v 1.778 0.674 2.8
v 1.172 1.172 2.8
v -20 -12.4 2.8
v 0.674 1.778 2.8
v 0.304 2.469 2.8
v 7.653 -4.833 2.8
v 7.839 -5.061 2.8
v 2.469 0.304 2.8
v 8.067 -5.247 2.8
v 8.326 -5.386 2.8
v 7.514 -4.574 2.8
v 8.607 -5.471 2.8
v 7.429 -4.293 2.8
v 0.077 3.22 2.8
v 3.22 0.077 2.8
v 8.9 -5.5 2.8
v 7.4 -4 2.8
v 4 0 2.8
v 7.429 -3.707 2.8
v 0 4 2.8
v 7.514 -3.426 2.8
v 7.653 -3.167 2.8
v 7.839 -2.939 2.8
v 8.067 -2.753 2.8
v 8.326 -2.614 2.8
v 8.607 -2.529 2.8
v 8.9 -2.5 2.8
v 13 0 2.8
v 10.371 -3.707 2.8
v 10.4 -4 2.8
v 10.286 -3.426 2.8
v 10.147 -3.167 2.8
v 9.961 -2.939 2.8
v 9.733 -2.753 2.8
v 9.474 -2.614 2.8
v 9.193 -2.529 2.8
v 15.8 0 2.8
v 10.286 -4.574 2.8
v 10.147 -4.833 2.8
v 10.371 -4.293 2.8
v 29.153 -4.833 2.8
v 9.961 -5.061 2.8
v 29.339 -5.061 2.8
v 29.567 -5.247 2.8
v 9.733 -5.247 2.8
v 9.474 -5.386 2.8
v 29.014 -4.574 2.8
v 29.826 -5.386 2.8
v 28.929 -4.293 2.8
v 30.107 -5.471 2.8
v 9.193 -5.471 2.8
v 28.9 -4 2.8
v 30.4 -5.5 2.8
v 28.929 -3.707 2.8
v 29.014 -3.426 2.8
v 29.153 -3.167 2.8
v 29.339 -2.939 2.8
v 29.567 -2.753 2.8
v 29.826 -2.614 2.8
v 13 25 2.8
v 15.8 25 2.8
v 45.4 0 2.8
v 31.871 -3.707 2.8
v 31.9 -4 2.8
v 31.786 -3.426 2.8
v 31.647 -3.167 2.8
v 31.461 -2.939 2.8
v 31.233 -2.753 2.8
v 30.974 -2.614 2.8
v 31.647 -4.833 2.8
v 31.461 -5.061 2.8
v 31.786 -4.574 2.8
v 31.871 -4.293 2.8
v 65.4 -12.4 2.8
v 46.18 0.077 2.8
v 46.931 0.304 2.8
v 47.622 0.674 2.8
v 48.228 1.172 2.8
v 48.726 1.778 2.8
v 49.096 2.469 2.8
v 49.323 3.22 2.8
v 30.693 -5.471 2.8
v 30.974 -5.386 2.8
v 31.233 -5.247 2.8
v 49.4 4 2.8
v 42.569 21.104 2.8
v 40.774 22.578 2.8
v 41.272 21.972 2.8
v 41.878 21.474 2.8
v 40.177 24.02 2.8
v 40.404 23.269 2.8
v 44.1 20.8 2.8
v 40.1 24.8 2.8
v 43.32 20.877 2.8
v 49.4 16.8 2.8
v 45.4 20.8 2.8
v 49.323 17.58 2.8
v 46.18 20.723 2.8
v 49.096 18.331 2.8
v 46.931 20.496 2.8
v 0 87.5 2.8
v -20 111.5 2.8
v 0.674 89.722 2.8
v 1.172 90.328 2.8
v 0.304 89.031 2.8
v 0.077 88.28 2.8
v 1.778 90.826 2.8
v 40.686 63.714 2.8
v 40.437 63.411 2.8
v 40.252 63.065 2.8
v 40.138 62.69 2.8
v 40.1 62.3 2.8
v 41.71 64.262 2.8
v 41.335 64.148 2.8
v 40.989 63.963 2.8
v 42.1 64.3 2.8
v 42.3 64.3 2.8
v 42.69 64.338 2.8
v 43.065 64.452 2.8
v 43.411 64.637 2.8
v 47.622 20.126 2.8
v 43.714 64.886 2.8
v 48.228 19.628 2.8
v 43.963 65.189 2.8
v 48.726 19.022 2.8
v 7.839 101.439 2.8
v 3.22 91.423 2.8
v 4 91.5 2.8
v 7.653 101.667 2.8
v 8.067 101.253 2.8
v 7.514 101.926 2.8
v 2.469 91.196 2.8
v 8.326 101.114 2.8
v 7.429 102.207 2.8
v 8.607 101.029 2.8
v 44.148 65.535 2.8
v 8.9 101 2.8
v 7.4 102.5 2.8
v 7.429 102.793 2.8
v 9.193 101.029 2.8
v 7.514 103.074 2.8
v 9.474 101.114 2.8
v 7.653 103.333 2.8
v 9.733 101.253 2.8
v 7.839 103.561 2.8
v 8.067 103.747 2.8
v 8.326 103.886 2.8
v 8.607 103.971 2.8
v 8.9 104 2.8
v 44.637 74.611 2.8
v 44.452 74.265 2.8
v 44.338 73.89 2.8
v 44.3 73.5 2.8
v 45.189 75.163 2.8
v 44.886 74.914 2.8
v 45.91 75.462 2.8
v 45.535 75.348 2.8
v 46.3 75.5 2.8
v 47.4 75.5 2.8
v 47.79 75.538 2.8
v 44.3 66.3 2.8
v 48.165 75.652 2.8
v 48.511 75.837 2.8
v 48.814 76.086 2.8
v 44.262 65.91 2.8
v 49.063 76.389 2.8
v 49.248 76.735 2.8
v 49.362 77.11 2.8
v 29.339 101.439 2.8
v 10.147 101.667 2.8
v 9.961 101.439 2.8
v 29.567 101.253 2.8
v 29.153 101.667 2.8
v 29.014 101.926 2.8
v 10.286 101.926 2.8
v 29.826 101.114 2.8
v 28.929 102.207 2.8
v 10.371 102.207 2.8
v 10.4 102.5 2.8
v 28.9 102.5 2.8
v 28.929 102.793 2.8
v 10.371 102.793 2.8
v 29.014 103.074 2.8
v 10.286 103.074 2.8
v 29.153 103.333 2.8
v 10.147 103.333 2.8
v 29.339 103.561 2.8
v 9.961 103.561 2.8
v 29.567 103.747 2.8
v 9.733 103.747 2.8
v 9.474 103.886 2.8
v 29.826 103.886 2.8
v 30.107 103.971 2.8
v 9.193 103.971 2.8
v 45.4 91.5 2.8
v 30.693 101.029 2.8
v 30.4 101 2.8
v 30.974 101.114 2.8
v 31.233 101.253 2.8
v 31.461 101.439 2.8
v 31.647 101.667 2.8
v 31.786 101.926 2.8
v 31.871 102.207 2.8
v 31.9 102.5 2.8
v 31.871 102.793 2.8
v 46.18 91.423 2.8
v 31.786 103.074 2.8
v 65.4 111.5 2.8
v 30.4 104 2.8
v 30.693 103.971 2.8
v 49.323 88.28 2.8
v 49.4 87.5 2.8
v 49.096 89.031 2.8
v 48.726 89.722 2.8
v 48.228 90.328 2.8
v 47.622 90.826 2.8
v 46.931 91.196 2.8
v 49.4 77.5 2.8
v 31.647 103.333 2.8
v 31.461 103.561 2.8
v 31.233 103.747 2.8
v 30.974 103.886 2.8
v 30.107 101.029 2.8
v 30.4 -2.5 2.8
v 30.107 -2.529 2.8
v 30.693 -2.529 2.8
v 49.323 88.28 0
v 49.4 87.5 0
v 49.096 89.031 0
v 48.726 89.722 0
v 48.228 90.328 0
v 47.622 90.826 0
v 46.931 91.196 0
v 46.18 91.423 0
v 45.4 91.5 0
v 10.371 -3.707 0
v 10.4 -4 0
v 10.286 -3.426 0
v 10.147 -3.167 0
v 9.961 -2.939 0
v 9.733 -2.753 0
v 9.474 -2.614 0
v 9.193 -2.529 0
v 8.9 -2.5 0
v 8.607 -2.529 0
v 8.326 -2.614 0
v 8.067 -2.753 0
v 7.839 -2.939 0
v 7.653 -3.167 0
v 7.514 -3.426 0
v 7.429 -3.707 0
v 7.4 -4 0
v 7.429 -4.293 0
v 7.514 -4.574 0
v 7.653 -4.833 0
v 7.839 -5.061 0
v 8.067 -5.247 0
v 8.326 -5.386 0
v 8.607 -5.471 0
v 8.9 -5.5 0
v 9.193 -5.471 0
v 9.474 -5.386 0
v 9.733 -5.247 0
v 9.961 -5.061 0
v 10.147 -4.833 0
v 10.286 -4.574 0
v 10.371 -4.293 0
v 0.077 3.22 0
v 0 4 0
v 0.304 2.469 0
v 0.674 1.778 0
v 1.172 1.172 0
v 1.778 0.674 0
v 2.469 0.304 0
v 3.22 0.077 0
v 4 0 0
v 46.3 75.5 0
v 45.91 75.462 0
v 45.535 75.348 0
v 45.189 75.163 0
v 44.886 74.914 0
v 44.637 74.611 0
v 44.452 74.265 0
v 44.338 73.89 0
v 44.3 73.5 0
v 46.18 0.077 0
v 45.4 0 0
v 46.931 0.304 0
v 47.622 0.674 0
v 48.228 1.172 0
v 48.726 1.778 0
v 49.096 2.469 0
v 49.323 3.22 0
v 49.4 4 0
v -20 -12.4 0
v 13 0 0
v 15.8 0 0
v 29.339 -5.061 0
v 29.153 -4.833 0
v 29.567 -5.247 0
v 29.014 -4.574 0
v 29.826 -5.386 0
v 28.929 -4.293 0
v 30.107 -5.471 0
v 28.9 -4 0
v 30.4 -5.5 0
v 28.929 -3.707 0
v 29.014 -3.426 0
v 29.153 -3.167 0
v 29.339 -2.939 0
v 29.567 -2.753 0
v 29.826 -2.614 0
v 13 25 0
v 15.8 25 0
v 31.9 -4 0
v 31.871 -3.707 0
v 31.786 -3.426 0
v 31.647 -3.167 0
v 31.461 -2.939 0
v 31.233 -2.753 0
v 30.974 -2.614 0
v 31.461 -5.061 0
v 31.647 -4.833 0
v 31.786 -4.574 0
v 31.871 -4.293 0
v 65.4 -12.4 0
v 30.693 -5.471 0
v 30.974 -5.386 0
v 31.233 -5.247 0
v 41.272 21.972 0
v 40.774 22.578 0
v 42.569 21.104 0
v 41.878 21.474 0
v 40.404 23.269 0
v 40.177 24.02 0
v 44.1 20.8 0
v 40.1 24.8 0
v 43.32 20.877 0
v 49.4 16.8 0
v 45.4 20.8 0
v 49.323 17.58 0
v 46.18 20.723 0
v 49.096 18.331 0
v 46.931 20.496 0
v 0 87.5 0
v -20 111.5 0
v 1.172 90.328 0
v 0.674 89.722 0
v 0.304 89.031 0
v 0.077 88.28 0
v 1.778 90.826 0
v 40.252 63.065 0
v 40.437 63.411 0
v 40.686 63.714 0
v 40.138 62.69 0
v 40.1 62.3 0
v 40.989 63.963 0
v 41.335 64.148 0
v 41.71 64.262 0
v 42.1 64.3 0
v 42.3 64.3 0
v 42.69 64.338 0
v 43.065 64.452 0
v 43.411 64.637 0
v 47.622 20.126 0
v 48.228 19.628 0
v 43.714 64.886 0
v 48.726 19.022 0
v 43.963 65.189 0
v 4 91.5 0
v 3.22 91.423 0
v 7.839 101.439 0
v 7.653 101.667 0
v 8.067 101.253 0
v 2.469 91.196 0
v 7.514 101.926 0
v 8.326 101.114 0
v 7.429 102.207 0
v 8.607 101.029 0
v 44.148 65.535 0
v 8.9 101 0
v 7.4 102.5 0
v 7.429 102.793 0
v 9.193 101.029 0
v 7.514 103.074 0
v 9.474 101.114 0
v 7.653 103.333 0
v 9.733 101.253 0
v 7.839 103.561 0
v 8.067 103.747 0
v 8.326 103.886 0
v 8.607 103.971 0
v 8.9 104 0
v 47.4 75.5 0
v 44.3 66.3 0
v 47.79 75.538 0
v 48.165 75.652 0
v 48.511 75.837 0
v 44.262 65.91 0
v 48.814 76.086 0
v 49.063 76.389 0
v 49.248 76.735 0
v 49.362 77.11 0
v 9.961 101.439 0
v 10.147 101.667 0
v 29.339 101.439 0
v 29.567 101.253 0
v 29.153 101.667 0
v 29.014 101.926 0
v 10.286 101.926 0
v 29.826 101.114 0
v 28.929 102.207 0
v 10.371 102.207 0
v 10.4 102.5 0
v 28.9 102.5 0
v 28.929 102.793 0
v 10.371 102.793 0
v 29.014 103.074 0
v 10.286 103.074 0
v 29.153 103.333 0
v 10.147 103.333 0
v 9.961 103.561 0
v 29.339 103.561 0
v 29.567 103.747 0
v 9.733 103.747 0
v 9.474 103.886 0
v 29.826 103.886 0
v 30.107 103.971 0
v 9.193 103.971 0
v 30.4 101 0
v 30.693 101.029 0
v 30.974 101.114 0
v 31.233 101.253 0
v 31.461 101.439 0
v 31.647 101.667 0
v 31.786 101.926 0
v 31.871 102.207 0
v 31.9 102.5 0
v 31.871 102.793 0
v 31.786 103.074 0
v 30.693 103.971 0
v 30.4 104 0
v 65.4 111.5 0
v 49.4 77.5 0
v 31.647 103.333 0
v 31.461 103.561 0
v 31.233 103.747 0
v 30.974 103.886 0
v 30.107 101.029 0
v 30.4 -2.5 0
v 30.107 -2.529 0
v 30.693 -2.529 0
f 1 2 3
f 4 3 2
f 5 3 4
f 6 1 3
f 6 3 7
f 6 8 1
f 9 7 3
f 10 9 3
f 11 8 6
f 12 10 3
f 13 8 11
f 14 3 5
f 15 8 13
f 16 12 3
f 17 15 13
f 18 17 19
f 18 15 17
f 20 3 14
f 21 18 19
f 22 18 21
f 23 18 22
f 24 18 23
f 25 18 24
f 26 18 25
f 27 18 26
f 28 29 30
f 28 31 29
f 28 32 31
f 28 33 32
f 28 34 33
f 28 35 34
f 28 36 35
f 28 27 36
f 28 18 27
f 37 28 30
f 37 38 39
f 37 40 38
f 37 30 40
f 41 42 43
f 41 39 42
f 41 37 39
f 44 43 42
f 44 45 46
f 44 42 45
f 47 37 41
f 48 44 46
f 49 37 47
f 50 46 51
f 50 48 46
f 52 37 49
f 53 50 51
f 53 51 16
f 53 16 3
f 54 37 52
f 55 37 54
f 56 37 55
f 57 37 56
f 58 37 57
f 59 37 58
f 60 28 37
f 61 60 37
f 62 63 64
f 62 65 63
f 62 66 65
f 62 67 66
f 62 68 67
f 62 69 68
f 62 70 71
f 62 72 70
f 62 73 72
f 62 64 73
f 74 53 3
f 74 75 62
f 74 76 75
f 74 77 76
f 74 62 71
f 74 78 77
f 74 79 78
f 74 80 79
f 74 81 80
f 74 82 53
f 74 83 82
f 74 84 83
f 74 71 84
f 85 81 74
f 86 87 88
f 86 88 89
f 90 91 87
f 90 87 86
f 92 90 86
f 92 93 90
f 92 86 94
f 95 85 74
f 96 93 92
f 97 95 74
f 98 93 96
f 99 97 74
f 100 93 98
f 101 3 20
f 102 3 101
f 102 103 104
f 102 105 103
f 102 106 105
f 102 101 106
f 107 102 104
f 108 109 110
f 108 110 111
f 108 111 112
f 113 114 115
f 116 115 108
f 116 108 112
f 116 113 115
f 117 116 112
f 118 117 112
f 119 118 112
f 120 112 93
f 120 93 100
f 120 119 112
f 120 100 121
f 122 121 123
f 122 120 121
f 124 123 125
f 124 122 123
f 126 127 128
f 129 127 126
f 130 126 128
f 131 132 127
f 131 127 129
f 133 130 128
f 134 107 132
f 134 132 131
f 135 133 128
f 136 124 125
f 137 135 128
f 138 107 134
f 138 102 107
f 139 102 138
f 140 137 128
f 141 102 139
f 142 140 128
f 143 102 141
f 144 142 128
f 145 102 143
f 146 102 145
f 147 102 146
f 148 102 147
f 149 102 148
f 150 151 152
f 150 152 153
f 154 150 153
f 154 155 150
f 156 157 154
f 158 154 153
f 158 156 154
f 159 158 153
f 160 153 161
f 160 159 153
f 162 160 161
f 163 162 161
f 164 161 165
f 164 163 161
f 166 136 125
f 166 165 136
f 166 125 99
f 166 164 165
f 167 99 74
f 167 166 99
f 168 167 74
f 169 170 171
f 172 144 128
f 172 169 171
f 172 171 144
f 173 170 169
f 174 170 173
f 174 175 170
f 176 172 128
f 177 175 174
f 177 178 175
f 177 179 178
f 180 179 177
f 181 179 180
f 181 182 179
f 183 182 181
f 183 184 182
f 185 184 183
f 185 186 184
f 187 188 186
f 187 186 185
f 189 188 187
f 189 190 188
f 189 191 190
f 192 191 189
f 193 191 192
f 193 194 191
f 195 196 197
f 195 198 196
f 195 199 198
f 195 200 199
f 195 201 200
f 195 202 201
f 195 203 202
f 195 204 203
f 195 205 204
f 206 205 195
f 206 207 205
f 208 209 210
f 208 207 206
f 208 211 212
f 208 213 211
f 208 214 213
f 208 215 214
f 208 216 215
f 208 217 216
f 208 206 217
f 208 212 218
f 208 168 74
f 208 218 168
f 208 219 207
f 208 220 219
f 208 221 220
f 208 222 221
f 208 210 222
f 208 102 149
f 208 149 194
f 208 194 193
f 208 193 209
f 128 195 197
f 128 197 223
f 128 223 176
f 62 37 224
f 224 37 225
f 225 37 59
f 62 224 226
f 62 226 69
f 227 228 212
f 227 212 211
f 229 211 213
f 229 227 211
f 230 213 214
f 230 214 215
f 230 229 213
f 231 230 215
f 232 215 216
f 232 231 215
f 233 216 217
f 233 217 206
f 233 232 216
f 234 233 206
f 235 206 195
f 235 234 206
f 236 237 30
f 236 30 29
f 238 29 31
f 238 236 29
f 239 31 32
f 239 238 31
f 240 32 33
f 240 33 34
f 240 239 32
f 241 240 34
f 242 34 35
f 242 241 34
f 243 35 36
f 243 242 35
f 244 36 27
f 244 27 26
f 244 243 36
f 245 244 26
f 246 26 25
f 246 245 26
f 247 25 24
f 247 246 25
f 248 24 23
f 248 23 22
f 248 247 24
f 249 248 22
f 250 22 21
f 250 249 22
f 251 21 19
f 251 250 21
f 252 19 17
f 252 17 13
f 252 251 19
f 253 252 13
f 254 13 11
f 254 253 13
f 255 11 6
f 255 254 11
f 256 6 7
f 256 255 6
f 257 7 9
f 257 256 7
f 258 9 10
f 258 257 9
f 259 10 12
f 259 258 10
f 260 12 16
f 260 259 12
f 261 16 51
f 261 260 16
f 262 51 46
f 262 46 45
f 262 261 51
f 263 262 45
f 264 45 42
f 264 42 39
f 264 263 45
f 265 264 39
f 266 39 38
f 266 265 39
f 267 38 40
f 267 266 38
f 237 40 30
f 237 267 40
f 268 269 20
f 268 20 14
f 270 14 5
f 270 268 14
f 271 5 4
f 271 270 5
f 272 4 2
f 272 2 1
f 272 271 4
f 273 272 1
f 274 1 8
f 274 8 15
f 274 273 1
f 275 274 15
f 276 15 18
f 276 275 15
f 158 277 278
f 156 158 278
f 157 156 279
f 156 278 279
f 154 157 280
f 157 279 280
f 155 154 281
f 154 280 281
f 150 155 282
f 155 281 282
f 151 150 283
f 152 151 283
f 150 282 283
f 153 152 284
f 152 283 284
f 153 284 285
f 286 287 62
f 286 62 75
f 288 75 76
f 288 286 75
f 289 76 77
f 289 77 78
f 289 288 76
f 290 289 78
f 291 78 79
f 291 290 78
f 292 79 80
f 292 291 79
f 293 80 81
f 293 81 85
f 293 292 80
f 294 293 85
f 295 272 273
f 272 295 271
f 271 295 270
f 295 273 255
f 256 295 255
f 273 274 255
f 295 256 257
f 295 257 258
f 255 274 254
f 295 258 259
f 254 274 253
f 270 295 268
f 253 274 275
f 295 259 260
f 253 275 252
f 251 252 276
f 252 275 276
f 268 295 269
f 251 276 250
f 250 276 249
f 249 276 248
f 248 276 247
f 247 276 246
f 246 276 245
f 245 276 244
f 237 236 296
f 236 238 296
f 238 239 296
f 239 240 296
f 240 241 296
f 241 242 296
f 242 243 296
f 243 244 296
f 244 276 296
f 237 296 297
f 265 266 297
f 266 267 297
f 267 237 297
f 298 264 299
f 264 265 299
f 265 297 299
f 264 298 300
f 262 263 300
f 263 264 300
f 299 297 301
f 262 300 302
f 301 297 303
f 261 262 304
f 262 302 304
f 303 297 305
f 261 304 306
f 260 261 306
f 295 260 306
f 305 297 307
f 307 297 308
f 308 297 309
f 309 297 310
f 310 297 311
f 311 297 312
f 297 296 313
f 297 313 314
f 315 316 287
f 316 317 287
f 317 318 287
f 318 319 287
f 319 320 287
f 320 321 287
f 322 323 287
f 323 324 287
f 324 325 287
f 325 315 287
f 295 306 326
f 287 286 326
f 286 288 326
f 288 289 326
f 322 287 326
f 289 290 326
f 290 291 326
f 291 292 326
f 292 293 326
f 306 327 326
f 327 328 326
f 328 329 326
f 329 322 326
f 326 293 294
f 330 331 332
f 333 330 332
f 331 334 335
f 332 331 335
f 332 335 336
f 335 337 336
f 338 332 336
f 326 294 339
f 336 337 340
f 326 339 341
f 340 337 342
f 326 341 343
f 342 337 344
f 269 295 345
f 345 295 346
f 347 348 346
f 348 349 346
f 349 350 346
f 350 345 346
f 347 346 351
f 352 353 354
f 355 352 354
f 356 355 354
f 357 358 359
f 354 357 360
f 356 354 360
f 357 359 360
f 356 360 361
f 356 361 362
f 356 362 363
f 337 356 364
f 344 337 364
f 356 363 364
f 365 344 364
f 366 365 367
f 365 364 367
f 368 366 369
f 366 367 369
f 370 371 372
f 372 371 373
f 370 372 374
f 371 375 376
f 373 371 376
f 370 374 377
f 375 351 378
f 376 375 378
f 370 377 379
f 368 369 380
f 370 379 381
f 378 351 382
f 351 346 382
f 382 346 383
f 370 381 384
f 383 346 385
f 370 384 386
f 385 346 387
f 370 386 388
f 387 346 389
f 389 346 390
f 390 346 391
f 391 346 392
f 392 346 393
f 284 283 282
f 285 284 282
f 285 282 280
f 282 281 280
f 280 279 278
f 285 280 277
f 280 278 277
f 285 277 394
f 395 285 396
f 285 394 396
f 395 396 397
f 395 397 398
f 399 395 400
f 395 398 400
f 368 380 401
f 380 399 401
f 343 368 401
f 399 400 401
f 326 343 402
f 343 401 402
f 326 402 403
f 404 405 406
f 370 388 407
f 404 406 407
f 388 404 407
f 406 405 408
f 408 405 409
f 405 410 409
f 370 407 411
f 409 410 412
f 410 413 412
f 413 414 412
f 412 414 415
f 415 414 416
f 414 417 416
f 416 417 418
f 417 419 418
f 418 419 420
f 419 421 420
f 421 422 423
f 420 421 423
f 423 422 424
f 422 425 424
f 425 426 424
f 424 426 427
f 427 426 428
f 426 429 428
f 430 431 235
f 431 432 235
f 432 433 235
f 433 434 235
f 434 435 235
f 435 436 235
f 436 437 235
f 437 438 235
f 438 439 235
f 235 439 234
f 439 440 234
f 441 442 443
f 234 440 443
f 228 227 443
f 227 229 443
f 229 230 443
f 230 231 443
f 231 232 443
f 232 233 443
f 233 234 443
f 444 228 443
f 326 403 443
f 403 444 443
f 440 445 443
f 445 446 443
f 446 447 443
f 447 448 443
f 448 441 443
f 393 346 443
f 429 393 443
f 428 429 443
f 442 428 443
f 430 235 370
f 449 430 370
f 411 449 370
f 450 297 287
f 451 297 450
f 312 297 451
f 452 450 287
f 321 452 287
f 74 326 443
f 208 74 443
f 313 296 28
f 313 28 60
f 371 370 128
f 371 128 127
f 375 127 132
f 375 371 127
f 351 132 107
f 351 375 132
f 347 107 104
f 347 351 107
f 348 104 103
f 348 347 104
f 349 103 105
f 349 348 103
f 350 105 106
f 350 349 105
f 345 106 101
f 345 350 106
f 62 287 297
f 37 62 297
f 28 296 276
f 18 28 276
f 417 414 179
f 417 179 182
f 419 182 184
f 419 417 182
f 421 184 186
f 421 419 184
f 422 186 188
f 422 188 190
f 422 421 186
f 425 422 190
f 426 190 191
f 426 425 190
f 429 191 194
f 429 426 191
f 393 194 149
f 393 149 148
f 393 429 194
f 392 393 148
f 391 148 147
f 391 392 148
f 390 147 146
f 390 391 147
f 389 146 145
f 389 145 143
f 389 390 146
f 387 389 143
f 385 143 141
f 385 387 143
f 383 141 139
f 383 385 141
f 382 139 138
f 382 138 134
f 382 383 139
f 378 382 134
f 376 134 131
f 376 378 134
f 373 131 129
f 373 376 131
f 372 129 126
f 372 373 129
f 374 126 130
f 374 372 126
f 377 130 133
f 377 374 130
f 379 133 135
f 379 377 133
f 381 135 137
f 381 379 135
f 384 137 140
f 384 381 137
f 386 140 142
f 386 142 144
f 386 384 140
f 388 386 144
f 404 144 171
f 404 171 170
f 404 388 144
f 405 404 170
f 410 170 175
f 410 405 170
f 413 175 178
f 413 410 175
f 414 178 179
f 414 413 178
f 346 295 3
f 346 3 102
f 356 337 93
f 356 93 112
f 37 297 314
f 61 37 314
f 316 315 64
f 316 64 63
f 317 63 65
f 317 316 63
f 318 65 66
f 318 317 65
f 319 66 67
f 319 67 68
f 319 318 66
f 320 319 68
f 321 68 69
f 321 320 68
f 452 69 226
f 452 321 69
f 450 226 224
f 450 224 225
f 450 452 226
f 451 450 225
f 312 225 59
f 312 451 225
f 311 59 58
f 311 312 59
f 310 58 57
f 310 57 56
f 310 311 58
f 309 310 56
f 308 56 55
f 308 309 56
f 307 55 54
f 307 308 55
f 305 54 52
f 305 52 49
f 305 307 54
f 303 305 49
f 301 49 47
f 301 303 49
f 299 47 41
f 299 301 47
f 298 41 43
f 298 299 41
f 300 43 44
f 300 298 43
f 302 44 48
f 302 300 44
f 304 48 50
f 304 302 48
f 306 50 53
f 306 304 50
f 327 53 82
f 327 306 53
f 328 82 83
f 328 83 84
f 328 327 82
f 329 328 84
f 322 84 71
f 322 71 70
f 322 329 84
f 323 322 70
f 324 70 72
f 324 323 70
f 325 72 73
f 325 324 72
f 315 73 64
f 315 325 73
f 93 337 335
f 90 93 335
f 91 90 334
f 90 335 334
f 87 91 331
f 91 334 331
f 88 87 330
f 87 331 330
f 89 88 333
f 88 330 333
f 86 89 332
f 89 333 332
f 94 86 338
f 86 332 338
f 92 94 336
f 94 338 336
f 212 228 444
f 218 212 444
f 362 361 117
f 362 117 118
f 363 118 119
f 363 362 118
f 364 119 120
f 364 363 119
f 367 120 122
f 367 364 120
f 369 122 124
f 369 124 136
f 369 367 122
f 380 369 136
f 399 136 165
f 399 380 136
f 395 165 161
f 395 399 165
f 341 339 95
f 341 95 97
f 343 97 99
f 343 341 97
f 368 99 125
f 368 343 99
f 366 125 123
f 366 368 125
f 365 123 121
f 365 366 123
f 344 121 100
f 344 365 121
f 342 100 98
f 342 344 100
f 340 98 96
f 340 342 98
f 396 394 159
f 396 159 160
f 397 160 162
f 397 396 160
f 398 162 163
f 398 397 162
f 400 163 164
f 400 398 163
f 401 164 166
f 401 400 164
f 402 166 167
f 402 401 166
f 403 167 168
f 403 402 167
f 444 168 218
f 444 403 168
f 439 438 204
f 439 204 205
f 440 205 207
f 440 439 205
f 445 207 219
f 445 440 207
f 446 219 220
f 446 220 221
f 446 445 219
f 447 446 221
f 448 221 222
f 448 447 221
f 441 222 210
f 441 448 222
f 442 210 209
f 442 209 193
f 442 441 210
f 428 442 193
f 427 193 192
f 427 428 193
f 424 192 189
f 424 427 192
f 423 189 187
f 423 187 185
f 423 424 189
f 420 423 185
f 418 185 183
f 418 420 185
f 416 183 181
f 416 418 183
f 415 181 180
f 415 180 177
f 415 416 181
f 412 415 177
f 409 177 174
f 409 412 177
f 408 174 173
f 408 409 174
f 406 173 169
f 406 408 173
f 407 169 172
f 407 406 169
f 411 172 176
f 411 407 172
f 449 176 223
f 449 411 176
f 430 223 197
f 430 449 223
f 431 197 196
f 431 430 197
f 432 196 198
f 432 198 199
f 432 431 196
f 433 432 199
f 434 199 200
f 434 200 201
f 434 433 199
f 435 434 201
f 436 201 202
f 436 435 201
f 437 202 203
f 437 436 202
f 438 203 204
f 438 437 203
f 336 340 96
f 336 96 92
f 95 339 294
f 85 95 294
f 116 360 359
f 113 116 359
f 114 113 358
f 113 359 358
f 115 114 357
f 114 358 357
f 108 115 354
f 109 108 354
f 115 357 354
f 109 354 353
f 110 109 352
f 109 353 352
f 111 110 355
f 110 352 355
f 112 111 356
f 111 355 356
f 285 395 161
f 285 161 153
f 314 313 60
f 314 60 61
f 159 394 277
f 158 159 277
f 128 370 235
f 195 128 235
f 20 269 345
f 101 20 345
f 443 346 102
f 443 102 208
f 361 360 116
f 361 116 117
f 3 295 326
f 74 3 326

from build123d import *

# Parameters (mm, degrees)
SKETCH_W     = 85.4
SKETCH_H     = 123.9
SKETCH_R     = 1.5
PAD_DEPTH    = 2.8
SKETCH001_W  = 2.8
SKETCH001_H  = 25
PAD001_DEPTH = 2.8


with BuildPart() as part:
    # Sketch → Pad (new body)
    with BuildSketch(Plane.XY):
        with Locations((22.7, 49.55)):
            Rectangle(SKETCH_W, SKETCH_H)
        with Locations((8.9, -4)):
            Circle(SKETCH_R, mode=Mode.SUBTRACT)
        with Locations((30.4, -4)):
            Circle(SKETCH_R, mode=Mode.SUBTRACT)
        with Locations((8.9, 102.5)):
            Circle(SKETCH_R, mode=Mode.SUBTRACT)
        with Locations((30.4, 102.5)):
            Circle(SKETCH_R, mode=Mode.SUBTRACT)
        with BuildLine():
            Line((4, 91.5), (45.4, 91.5))
            ThreePointArc((49.4, 87.5), (48.228427, 90.328427), (45.4, 91.5))
            Line((49.4, 87.5), (49.4, 77.5))
            ThreePointArc((47.4, 75.5), (48.814214, 76.085786), (49.4, 77.5))
            Line((47.4, 75.5), (46.3, 75.5))
            ThreePointArc((46.3, 75.5), (44.885786, 74.914214), (44.3, 73.5))
            Line((44.3, 66.3), (44.3, 73.5))
            ThreePointArc((42.3, 64.3), (43.714214, 64.885786), (44.3, 66.3))
            Line((42.1, 64.3), (42.3, 64.3))
            ThreePointArc((42.1, 64.3), (40.685786, 63.714214), (40.1, 62.3))
            Line((40.1, 24.8), (40.1, 62.3))
            ThreePointArc((40.1, 24.8), (41.271573, 21.971573), (44.1, 20.8))
            Line((45.4, 20.8), (44.1, 20.8))
            ThreePointArc((49.4, 16.8), (48.228427, 19.628427), (45.4, 20.8))
            Line((49.4, 16.8), (49.4, 4))
            ThreePointArc((45.4, 0), (48.228427, 1.171573), (49.4, 4))
            Line((45.4, 0), (4, 0))
            ThreePointArc((0, 4), (1.171573, 1.171573), (4, 0))
            Line((0, 4), (0, 87.5))
            ThreePointArc((4, 91.5), (1.171573, 90.328427), (0, 87.5))
        make_face(mode=Mode.SUBTRACT)
    extrude(amount=PAD_DEPTH)

    # Sketch001 → Pad001 (join)
    with BuildSketch(Plane.XY):
        with Locations((14.4, 12.5)):
            Rectangle(SKETCH001_W, SKETCH001_H)
    extrude(amount=PAD001_DEPTH)


solid = part.part
